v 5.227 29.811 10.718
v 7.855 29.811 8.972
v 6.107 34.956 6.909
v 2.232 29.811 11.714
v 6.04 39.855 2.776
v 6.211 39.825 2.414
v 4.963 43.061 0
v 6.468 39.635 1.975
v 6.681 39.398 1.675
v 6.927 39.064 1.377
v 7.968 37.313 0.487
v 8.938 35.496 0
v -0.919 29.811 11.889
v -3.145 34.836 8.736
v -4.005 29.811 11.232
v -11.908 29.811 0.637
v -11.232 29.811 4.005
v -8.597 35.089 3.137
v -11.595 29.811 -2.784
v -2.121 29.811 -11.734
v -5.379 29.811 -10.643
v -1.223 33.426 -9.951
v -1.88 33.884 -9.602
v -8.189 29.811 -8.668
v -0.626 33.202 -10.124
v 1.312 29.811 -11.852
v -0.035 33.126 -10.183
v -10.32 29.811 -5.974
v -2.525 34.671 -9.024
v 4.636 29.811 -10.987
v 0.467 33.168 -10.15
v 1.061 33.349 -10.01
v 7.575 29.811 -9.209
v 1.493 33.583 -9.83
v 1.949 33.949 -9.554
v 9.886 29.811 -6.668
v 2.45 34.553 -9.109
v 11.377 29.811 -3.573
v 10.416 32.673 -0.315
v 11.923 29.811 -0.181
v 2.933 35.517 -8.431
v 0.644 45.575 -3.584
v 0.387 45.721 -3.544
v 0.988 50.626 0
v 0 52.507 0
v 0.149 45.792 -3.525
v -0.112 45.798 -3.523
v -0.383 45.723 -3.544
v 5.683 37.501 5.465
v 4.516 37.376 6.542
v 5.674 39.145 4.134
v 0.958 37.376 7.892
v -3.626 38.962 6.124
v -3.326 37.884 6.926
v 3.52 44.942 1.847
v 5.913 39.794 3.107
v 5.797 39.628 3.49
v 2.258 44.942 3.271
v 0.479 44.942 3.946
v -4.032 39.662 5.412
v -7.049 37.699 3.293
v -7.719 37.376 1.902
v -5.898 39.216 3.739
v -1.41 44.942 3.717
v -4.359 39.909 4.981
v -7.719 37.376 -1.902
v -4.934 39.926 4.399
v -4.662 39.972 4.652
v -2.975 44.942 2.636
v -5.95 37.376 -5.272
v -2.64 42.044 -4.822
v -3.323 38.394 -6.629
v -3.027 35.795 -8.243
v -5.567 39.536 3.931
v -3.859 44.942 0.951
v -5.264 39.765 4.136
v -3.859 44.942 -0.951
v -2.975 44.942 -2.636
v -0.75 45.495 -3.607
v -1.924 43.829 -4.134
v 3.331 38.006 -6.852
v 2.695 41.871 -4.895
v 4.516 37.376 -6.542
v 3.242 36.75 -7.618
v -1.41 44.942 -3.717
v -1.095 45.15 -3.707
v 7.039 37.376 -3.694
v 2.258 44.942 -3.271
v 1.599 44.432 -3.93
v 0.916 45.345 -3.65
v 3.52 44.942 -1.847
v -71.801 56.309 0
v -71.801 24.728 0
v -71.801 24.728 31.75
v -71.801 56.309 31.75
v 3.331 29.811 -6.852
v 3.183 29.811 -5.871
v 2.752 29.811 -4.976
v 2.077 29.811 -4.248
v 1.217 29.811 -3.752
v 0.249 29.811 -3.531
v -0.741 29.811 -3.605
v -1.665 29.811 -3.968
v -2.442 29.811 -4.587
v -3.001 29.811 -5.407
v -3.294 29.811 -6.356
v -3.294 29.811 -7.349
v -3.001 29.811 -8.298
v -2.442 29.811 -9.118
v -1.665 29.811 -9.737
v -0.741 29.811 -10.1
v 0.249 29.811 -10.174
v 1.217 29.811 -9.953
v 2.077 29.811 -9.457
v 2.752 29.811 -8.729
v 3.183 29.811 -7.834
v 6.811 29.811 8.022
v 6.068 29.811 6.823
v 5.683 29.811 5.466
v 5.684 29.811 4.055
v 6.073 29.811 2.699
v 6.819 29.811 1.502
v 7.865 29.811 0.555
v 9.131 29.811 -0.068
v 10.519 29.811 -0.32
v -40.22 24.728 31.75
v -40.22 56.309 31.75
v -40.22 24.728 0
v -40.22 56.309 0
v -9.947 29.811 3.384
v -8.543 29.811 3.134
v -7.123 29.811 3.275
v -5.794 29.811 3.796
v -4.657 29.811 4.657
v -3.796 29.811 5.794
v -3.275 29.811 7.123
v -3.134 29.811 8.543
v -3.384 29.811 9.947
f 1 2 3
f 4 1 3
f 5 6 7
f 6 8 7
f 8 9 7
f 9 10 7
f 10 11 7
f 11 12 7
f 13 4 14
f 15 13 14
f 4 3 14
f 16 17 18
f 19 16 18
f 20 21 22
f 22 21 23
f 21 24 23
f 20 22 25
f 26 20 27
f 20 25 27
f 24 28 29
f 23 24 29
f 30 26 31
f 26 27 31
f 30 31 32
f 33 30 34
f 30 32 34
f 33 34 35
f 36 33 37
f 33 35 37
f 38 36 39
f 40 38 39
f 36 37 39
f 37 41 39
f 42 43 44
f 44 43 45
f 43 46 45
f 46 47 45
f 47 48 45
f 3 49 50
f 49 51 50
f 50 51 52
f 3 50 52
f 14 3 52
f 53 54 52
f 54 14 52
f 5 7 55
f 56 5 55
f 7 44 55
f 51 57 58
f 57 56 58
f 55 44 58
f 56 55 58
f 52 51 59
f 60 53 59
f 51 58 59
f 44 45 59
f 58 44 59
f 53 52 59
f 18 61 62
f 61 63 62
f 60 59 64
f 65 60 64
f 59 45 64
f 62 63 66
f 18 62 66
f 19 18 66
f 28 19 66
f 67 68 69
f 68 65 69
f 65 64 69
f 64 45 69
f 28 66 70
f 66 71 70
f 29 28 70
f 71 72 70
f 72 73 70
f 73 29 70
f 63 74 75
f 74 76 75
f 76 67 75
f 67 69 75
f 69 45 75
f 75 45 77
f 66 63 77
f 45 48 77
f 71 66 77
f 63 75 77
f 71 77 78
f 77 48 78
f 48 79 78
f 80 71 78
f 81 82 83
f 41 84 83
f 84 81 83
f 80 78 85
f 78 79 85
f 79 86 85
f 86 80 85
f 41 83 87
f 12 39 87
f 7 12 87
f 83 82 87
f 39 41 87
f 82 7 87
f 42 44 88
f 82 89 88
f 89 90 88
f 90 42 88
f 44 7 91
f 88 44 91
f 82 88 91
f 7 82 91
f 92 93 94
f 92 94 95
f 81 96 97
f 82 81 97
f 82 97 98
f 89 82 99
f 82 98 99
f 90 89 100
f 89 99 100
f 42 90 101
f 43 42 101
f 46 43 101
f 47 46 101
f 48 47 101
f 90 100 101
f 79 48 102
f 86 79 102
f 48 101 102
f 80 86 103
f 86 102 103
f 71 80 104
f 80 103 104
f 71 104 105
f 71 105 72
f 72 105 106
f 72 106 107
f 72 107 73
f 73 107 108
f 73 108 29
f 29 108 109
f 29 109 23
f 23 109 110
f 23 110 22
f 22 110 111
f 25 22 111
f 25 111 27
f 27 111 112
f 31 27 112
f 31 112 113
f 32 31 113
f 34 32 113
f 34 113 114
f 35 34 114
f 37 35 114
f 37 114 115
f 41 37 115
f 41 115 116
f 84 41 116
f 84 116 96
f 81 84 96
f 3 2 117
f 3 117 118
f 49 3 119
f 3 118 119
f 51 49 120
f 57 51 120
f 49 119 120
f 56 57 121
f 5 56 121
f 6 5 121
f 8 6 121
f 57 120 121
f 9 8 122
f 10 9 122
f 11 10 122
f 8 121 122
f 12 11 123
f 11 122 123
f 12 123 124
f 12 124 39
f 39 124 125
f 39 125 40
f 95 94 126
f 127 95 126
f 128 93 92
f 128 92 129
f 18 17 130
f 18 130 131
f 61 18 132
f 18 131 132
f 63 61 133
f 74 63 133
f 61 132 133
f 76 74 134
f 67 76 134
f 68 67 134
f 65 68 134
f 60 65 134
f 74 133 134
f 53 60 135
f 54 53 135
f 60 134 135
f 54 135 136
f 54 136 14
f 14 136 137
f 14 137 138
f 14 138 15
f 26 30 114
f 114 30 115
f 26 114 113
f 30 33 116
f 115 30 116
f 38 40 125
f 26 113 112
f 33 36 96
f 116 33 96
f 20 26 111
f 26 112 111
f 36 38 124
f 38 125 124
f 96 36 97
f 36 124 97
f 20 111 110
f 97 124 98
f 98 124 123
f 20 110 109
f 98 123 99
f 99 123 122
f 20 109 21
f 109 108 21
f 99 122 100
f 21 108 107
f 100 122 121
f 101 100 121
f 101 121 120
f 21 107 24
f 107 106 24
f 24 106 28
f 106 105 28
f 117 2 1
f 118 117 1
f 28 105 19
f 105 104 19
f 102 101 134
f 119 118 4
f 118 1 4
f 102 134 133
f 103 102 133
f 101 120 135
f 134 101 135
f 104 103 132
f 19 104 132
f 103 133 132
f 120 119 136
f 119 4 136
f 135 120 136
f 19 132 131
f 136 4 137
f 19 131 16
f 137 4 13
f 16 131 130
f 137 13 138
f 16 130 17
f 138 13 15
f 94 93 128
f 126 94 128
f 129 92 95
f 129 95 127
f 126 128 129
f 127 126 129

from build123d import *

# Parameters (mm, degrees)
F0_W     = 31.580493
F0_H     = 31.580493
F1_DEPTH = 31.75
F5_R     = 5.211632
F5_R_2   = 5.091019
F5_R_3   = 3.33095
F6_DEPTH = 81.709609


with BuildPart() as f1:
    # F0 (on Top) → F1 (new body)
    with BuildSketch(Plane.XY):
        with Locations((-56.010683, 40.518362)):
            Rectangle(F0_W, F0_H)
    extrude(amount=F1_DEPTH)


with BuildPart() as f3:
    # F2 (on Top) → F3 (revolve)
    with BuildSketch(Plane.XY):
        Polygon((11.924568, 29.811418), (0, 52.506562), (0, 29.811418), align=None)
    revolve(axis=Axis((0, 41.15899, 0), (0, -1, 0)))

    # F5 (on offset) → F6 (cut, through all)
    with BuildSketch(Plane.XZ.offset(25.4)):
        with Locations((-8.342019, 8.342016)):
            Circle(F5_R)
        with Locations((10.725448, 4.766865)):
            Circle(F5_R_2)
        with Locations((0, -6.852373)):
            Circle(F5_R_3)
    extrude(amount=-F6_DEPTH, mode=Mode.SUBTRACT)


solid = Compound([f1.part, f3.part])
